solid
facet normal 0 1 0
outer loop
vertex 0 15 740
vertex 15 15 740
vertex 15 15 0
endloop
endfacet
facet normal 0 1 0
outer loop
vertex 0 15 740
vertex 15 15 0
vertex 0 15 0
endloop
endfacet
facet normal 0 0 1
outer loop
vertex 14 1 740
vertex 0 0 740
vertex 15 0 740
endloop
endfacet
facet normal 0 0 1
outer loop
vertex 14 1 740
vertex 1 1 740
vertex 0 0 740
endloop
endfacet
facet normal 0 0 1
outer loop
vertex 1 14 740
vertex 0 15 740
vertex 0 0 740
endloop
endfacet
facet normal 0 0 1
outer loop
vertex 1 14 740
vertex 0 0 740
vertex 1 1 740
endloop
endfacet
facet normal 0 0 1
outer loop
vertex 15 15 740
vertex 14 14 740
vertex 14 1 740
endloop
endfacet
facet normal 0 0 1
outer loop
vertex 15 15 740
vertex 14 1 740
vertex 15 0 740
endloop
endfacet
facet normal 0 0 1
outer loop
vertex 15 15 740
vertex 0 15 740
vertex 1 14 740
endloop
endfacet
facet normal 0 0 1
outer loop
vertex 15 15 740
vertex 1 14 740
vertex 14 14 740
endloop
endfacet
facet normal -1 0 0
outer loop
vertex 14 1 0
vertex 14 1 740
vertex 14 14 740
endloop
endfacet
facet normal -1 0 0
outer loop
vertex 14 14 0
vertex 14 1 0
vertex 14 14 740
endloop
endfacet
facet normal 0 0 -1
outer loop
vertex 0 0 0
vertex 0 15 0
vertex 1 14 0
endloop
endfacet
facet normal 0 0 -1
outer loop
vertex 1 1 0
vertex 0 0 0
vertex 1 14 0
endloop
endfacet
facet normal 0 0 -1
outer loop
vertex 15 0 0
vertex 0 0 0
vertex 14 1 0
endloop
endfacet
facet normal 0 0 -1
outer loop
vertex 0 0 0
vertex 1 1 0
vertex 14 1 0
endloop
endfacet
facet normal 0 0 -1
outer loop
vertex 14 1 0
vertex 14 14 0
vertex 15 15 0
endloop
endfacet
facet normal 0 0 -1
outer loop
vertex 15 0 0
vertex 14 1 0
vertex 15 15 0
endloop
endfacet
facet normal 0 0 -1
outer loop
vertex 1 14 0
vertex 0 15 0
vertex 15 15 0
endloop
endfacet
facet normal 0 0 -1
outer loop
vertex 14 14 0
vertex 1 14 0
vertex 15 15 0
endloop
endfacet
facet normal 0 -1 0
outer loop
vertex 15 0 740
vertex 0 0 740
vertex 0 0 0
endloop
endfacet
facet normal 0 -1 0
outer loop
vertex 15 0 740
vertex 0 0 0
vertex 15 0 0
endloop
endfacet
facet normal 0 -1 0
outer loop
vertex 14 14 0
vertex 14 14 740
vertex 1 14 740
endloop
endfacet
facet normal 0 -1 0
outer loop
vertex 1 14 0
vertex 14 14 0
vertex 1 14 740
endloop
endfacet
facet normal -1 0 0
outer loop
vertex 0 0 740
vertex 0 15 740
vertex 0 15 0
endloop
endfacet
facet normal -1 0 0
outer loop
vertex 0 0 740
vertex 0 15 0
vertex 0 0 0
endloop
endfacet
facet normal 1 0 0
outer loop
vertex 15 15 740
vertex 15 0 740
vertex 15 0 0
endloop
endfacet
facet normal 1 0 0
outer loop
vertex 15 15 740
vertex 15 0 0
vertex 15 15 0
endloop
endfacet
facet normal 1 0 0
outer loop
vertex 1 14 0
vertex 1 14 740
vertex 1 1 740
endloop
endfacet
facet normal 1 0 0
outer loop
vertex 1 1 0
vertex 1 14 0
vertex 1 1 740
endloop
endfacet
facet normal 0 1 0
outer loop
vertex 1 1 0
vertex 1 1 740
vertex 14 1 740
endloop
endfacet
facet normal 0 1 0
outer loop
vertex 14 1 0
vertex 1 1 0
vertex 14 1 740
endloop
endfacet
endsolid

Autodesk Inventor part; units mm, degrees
ref_plane "YZ Plane" through (0, 0, 0) normal (1, 0, 0) x (0, 1, 0)
ref_plane "XZ Plane" through (0, 0, 0) normal (0, 1, 0) x (-1, 0, 0)
ref_plane "XY Plane" through (0, 0, 0) normal (0, 0, 1) x (1, 0, 0)
sketch "スケッチ1" plane through (0, 0, 0) normal (0, 0, 1) x (1, 0, 0)
  line L0 (0, 0) -> (15, 0)
  line L1 (15, 0) -> (15, 15)
  line L2 (15, 15) -> (0, 15)
  line L3 (0, 15) -> (0, 0)
  dimension "d0" = 15
  dimension "d1" = 15
extrude "押し出し1" add sketch "スケッチ1" along normal blind 740
sketch "スケッチ2" plane through (0, 0, 0) normal (0, 0, -1) x (-1, 0, 0)
  point P0 (0, 0)
sketch "スケッチ3" plane through (0, 0, 740) normal (0, 0, 1) x (1, 0, 0)
  line L0 (1, 1) -> (14, 1)
  line L1 (14, 1) -> (14, 14)
  line L2 (14, 14) -> (1, 14)
  line L3 (1, 14) -> (1, 1)
  line L4 (0, 15) -> (0, 0) projected
  line L5 (0, 0) -> (15, 0) projected
  dimension "d4" = 13
  dimension "d5" = 13
  dimension "d6" = 1
  dimension "d7" = 1
extrude "押し出し2" cut sketch "スケッチ3" against normal blind 740
equation "\"BendRadius\" = Thickness"
equation "\"BendReliefWidth\" = Thickness"
equation "\"BendReliefDepth\" = 0.5 * Thickness"
equation "\"CornerReliefSize\" = 4 * Thickness"
equation "\"MinimumRemnant\" = 2 * Thickness"
equation "\"TransitionRadius\" = BendRadius"
equation "\"JacobiRadiusSize\" = BendRadius"
equation "\"GapSize\" = Thickness"
equation "\"Thickness\" = 0.5"
properties part number "足3"
